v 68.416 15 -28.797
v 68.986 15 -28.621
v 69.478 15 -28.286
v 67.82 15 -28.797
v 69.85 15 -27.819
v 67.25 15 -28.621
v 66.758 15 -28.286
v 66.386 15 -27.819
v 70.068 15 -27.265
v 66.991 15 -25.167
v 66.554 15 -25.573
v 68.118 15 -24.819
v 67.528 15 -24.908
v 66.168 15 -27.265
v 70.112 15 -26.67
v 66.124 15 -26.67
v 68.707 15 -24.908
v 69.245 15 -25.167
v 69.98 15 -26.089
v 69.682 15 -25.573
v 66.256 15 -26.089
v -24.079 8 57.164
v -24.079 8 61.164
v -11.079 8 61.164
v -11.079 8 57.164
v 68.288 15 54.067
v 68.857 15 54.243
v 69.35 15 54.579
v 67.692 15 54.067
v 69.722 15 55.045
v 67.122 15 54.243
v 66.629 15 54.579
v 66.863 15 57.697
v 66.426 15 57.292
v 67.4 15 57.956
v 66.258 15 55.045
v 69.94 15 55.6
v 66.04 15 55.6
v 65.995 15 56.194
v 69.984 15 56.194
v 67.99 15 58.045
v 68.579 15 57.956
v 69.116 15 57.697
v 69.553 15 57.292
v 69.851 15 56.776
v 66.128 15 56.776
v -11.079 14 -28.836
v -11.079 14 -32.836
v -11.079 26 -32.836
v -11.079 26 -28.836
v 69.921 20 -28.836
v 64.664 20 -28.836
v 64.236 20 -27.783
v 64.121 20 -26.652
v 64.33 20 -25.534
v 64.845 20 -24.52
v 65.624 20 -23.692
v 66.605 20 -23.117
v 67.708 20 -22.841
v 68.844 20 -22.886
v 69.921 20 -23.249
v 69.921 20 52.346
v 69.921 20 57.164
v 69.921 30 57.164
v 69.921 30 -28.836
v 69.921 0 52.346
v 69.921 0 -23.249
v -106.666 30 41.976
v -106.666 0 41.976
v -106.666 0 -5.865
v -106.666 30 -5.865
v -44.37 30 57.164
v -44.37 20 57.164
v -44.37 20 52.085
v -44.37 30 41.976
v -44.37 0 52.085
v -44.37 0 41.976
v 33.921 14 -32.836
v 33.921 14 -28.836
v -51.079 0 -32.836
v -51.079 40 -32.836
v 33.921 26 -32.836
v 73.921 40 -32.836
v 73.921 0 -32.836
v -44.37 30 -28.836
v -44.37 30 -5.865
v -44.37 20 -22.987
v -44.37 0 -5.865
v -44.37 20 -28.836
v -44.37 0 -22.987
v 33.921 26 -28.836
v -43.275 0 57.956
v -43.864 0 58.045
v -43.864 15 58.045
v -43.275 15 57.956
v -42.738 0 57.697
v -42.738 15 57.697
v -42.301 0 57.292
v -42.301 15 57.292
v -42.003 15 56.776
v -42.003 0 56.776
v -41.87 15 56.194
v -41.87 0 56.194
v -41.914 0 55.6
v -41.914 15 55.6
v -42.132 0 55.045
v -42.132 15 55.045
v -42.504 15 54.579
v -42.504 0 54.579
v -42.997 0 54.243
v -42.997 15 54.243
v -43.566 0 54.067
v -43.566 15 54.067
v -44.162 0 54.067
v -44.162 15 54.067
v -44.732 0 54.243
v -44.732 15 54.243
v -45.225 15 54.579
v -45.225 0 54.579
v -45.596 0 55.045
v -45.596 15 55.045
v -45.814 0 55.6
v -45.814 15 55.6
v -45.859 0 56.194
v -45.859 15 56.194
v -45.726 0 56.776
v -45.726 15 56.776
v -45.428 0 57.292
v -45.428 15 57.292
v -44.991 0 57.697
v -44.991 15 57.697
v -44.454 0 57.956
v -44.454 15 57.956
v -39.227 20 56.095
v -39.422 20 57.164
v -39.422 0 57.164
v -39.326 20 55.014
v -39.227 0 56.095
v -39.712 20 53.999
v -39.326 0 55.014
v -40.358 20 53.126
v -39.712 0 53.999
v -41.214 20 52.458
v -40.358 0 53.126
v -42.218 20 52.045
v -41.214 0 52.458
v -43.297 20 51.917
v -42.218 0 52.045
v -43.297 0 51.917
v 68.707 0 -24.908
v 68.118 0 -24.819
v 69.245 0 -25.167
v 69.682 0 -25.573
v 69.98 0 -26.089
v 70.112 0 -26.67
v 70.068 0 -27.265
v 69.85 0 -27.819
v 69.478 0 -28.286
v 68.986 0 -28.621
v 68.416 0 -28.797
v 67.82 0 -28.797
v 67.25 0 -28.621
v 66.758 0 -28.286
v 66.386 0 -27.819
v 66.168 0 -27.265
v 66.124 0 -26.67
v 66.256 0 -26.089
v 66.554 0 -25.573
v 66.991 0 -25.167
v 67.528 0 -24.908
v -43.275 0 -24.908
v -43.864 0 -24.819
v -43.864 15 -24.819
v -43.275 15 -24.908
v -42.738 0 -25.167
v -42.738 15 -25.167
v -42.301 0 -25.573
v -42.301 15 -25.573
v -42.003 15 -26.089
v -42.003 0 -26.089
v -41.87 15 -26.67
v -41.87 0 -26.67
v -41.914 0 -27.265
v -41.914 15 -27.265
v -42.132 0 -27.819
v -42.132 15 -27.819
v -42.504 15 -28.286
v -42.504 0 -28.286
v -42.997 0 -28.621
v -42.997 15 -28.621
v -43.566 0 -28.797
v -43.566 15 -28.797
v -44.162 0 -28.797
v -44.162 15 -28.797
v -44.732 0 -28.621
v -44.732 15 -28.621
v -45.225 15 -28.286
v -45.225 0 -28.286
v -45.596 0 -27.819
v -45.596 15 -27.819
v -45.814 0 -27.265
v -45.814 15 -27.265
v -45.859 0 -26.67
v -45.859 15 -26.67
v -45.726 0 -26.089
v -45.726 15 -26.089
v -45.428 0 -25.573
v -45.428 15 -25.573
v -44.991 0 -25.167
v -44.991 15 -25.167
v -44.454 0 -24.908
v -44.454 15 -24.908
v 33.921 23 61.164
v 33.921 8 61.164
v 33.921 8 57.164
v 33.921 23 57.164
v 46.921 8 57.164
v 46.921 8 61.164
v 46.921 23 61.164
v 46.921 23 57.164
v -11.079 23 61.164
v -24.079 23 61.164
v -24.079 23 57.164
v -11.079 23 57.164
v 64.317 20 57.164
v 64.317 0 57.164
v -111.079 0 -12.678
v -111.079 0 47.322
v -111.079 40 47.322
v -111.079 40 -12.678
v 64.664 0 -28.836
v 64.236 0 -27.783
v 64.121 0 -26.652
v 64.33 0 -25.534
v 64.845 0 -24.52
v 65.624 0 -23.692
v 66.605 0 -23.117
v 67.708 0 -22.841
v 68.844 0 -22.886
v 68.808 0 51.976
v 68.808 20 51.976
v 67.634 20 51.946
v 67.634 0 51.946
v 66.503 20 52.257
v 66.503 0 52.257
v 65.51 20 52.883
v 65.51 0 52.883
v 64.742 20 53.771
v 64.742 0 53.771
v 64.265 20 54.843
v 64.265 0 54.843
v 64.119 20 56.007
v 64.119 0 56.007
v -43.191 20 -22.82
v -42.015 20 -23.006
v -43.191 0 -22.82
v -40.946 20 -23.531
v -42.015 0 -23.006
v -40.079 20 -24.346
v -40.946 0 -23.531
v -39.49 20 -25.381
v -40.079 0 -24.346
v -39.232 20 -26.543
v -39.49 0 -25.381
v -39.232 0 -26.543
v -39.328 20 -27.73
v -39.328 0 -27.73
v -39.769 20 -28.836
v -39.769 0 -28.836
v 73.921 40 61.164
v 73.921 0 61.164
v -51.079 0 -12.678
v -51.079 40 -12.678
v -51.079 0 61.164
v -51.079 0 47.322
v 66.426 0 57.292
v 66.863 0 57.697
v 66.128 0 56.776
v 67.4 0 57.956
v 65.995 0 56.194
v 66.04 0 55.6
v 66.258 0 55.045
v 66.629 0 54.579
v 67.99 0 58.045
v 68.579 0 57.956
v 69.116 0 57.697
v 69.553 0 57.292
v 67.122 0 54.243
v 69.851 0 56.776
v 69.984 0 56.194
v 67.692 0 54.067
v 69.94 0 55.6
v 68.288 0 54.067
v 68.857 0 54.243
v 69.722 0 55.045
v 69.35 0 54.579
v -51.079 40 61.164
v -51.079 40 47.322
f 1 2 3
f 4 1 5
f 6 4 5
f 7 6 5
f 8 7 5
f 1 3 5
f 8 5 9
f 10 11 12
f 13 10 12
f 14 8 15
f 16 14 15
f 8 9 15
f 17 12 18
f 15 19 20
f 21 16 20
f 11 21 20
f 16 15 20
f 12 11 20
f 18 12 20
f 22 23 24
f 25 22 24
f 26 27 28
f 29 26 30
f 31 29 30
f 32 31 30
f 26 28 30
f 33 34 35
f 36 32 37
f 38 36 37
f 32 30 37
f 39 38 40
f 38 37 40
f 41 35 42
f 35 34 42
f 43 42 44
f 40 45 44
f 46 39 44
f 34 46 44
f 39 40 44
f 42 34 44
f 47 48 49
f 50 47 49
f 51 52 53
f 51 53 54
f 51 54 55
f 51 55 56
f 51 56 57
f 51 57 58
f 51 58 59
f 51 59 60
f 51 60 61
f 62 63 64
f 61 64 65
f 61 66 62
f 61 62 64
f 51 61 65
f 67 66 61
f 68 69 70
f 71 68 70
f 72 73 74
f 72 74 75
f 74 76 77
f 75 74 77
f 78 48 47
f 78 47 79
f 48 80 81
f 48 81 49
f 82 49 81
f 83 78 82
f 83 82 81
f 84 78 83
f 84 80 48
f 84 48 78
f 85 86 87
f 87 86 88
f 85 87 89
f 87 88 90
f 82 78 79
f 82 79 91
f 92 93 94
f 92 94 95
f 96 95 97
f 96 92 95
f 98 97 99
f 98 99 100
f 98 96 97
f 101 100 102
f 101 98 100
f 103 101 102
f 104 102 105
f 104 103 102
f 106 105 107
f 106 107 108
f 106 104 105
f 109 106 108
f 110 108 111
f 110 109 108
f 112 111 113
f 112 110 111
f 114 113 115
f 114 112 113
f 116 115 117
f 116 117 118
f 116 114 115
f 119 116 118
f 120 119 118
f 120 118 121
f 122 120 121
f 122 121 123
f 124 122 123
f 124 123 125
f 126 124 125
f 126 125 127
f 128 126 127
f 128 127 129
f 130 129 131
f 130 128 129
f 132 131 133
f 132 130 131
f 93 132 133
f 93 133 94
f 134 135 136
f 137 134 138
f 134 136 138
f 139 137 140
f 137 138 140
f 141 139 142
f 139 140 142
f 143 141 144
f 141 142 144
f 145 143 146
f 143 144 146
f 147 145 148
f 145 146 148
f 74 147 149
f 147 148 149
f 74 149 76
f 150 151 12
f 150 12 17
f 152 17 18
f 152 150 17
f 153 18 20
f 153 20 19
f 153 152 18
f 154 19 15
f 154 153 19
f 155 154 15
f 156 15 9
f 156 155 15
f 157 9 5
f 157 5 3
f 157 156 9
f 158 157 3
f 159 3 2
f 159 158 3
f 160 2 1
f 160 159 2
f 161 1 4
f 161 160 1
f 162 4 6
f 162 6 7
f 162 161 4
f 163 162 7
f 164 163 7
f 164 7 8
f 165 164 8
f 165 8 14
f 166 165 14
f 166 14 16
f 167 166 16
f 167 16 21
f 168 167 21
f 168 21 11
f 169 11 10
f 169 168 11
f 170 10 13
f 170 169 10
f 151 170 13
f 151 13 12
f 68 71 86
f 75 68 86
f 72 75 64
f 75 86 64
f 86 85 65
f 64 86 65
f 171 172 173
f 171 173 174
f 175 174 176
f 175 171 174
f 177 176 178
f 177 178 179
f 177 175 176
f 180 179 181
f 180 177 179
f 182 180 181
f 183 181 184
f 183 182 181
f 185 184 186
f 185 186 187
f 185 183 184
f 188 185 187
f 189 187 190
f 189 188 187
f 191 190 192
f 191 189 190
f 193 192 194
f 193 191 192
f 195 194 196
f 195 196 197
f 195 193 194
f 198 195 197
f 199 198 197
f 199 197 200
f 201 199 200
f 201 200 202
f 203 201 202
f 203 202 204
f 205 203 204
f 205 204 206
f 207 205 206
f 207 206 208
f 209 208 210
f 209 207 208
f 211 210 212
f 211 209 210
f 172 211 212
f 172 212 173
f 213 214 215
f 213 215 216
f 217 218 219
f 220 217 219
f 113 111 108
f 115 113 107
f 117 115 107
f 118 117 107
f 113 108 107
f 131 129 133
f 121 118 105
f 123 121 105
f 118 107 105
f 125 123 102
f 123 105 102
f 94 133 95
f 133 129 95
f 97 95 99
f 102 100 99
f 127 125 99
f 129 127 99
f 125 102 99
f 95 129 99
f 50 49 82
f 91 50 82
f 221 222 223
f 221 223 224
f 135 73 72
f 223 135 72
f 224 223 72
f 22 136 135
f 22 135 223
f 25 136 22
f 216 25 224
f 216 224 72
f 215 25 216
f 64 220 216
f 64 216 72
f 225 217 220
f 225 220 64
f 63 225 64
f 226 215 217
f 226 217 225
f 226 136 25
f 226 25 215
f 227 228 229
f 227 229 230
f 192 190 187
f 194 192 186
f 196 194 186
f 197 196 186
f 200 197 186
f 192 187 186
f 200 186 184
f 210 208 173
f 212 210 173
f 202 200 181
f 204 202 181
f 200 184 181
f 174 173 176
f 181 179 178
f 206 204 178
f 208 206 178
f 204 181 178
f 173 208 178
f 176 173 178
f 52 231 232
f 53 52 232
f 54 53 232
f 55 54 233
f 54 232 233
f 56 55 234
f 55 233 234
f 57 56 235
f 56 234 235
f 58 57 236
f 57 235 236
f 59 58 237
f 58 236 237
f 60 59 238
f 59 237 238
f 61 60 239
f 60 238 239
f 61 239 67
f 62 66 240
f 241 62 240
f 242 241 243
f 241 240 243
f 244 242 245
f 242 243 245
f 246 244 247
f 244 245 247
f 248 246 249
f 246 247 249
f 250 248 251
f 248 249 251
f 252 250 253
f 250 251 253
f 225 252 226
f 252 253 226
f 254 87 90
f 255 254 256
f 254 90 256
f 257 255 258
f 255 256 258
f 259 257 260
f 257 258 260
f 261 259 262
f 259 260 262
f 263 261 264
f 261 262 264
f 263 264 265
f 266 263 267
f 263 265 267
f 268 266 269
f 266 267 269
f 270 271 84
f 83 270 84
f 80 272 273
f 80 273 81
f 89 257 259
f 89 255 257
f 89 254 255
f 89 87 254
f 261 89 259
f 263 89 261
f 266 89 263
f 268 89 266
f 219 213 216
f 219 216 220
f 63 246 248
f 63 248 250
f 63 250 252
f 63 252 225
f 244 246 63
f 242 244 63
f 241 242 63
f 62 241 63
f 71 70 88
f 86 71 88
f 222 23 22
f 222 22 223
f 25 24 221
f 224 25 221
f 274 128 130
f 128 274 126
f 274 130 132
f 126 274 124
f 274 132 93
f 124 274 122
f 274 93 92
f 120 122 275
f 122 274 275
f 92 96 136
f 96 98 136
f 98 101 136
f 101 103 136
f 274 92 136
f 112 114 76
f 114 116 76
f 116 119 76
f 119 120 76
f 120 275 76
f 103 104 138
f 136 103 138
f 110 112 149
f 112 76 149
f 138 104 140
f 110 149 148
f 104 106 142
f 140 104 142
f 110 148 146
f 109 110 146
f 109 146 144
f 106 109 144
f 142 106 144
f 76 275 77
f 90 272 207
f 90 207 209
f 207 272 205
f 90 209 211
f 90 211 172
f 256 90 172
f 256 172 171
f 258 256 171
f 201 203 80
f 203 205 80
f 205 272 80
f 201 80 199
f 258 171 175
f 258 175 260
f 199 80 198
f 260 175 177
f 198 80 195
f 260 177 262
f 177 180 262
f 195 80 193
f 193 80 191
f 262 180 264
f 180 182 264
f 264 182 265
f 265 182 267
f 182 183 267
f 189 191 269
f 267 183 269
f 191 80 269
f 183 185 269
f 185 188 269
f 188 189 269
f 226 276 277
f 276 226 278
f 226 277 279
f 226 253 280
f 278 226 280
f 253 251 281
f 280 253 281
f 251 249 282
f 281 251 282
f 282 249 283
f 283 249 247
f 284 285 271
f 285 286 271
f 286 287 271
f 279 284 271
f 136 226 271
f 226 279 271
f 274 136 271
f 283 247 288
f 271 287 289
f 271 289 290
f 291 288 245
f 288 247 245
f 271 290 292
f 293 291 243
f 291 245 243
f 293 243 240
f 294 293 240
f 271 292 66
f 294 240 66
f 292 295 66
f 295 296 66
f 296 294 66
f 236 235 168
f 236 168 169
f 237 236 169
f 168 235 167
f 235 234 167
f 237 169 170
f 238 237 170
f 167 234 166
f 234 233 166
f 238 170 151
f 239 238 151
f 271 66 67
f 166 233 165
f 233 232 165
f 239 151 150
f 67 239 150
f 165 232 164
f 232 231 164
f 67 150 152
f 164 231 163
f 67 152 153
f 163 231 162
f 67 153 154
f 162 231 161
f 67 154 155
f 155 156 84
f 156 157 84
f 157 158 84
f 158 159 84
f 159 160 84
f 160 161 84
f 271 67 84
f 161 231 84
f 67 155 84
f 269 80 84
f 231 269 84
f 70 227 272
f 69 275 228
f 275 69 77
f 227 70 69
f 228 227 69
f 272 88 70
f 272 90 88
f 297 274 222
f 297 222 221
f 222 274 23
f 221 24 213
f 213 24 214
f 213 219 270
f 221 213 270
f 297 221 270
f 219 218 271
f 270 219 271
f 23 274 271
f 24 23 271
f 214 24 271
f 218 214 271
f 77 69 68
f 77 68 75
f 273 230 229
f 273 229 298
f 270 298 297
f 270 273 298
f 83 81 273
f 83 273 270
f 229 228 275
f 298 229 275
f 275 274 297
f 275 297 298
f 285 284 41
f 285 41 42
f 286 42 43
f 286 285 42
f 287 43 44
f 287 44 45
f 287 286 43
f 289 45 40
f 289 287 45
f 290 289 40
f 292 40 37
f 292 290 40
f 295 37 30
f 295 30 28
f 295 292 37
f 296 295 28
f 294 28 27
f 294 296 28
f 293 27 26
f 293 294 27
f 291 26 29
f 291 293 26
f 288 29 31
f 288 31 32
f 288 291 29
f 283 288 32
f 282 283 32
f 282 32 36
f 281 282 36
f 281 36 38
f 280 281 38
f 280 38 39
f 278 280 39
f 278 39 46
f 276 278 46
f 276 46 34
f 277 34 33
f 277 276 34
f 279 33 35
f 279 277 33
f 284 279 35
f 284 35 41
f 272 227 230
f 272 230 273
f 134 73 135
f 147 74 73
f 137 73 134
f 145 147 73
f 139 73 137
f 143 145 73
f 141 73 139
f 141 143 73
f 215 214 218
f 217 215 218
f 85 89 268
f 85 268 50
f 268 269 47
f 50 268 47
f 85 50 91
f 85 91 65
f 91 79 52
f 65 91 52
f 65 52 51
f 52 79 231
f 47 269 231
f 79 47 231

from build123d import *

# Parameters (mm, degrees)
SKETCH1_W           = 125
SKETCH1_H           = 94
BOSS_EXTRUDE1_DEPTH = 40
SKETCH2_W           = 114.291192295
SKETCH2_H           = 86
CUT_EXTRUDE1_DEPTH  = 30
CUT_EXTRUDE2_START  = 61.163706
SKETCH3_W           = 13
SKETCH3_H           = 15
CUT_EXTRUDE2_DEPTH  = 10
SKETCH4_R           = 4
BOSS_EXTRUDE2_DEPTH = 20
SKETCH5_R           = 2
CUT_EXTRUDE3_DEPTH  = 15
CUT_EXTRUDE4_START  = -38.836294
SKETCH6_W           = 45
SKETCH6_H           = 12
CUT_EXTRUDE4_DEPTH  = 10
SKETCH7_W           = 60
SKETCH7_H           = 60
BOSS_EXTRUDE3_DEPTH = 40
SKETCH8_W           = 62.296403185
SKETCH8_H           = 47.840676856
CUT_EXTRUDE5_DEPTH  = 30


with BuildPart() as part:
    # Sketch1 → Boss-Extrude1 (new body)
    with BuildSketch(Plane(origin=(0, 0, 0), x_dir=(1, 0, 0), z_dir=(0, 1, 0))):
        with Locations((11.421319797, -14.163705584)):
            Rectangle(SKETCH1_W, SKETCH1_H)
    extrude(amount=BOSS_EXTRUDE1_DEPTH)

    # Sketch2 → Cut-Extrude1 (cut)
    with BuildSketch(Plane(origin=(0, 0, 0), x_dir=(1, 0, 0), z_dir=(0, 1, 0))):
        with Locations((12.77572365, -14.163705584)):
            Rectangle(SKETCH2_W, SKETCH2_H)
    extrude(amount=CUT_EXTRUDE1_DEPTH, mode=Mode.SUBTRACT)

    # Sketch3 → Cut-Extrude2 (cut)
    with BuildSketch(Plane.XY.offset(CUT_EXTRUDE2_START)):
        with Locations((-17.578680203, 15.5)):
            Rectangle(SKETCH3_W, SKETCH3_H)
        with Locations((40.421319797, 15.5)):
            Rectangle(SKETCH3_W, SKETCH3_H)
    extrude(amount=-CUT_EXTRUDE2_DEPTH, mode=Mode.SUBTRACT)

    # Sketch4 → Boss-Extrude2 (add)
    with BuildSketch(Plane(origin=(0, 0, 0), x_dir=(1, 0, 0), z_dir=(0, 1, 0))):
        with Locations((-43.22295396, -55.91654856)):
            Circle(SKETCH4_R)
        with Locations((68.117960644, -55.91654856)):
            Circle(SKETCH4_R)
        with Locations((68.117960644, 26.819499734)):
            Circle(SKETCH4_R)
        with Locations((-43.22295396, 26.819499734)):
            Circle(SKETCH4_R)
    extrude(amount=BOSS_EXTRUDE2_DEPTH)

    # Sketch5 → Cut-Extrude3 (cut)
    with BuildSketch(Plane(origin=(0, 0, 0), x_dir=(1, 0, 0), z_dir=(0, 1, 0))):
        with Locations(Location((-43.864318676, -56.044821503, 0), (0, 0, 270))):
            Circle(SKETCH5_R)
        with Locations(Location((67.989687701, -56.044821503, 0), (0, 0, 270))):
            Circle(SKETCH5_R)
        with Locations(Location((68.117960644, 26.819499734, 0), (0, 0, 270))):
            Circle(SKETCH5_R)
        with Locations(Location((-43.864318676, 26.819499734, 0), (0, 0, 270))):
            Circle(SKETCH5_R)
    extrude(amount=CUT_EXTRUDE3_DEPTH, mode=Mode.SUBTRACT)

    # Sketch6 → Cut-Extrude4 (cut)
    with BuildSketch(Plane.XY.offset(CUT_EXTRUDE4_START)):
        with Locations((11.421319797, 20)):
            Rectangle(SKETCH6_W, SKETCH6_H)
    extrude(amount=CUT_EXTRUDE4_DEPTH, mode=Mode.SUBTRACT)

    # Sketch7 → Boss-Extrude3 (add)
    with BuildSketch(Plane(origin=(0, 0, 0), x_dir=(1, 0, 0), z_dir=(0, 1, 0))):
        with Locations((-81.078680203, -17.322261373)):
            Rectangle(SKETCH7_W, SKETCH7_H)
    extrude(amount=BOSS_EXTRUDE3_DEPTH)

    # Sketch8 → Cut-Extrude5 (cut)
    with BuildSketch(Plane(origin=(0, 0, 0), x_dir=(1, 0, 0), z_dir=(0, 1, 0))):
        with Locations((-75.518074091, -18.055506677)):
            Rectangle(SKETCH8_W, SKETCH8_H)
    extrude(amount=CUT_EXTRUDE5_DEPTH, mode=Mode.SUBTRACT)


solid = part.part
